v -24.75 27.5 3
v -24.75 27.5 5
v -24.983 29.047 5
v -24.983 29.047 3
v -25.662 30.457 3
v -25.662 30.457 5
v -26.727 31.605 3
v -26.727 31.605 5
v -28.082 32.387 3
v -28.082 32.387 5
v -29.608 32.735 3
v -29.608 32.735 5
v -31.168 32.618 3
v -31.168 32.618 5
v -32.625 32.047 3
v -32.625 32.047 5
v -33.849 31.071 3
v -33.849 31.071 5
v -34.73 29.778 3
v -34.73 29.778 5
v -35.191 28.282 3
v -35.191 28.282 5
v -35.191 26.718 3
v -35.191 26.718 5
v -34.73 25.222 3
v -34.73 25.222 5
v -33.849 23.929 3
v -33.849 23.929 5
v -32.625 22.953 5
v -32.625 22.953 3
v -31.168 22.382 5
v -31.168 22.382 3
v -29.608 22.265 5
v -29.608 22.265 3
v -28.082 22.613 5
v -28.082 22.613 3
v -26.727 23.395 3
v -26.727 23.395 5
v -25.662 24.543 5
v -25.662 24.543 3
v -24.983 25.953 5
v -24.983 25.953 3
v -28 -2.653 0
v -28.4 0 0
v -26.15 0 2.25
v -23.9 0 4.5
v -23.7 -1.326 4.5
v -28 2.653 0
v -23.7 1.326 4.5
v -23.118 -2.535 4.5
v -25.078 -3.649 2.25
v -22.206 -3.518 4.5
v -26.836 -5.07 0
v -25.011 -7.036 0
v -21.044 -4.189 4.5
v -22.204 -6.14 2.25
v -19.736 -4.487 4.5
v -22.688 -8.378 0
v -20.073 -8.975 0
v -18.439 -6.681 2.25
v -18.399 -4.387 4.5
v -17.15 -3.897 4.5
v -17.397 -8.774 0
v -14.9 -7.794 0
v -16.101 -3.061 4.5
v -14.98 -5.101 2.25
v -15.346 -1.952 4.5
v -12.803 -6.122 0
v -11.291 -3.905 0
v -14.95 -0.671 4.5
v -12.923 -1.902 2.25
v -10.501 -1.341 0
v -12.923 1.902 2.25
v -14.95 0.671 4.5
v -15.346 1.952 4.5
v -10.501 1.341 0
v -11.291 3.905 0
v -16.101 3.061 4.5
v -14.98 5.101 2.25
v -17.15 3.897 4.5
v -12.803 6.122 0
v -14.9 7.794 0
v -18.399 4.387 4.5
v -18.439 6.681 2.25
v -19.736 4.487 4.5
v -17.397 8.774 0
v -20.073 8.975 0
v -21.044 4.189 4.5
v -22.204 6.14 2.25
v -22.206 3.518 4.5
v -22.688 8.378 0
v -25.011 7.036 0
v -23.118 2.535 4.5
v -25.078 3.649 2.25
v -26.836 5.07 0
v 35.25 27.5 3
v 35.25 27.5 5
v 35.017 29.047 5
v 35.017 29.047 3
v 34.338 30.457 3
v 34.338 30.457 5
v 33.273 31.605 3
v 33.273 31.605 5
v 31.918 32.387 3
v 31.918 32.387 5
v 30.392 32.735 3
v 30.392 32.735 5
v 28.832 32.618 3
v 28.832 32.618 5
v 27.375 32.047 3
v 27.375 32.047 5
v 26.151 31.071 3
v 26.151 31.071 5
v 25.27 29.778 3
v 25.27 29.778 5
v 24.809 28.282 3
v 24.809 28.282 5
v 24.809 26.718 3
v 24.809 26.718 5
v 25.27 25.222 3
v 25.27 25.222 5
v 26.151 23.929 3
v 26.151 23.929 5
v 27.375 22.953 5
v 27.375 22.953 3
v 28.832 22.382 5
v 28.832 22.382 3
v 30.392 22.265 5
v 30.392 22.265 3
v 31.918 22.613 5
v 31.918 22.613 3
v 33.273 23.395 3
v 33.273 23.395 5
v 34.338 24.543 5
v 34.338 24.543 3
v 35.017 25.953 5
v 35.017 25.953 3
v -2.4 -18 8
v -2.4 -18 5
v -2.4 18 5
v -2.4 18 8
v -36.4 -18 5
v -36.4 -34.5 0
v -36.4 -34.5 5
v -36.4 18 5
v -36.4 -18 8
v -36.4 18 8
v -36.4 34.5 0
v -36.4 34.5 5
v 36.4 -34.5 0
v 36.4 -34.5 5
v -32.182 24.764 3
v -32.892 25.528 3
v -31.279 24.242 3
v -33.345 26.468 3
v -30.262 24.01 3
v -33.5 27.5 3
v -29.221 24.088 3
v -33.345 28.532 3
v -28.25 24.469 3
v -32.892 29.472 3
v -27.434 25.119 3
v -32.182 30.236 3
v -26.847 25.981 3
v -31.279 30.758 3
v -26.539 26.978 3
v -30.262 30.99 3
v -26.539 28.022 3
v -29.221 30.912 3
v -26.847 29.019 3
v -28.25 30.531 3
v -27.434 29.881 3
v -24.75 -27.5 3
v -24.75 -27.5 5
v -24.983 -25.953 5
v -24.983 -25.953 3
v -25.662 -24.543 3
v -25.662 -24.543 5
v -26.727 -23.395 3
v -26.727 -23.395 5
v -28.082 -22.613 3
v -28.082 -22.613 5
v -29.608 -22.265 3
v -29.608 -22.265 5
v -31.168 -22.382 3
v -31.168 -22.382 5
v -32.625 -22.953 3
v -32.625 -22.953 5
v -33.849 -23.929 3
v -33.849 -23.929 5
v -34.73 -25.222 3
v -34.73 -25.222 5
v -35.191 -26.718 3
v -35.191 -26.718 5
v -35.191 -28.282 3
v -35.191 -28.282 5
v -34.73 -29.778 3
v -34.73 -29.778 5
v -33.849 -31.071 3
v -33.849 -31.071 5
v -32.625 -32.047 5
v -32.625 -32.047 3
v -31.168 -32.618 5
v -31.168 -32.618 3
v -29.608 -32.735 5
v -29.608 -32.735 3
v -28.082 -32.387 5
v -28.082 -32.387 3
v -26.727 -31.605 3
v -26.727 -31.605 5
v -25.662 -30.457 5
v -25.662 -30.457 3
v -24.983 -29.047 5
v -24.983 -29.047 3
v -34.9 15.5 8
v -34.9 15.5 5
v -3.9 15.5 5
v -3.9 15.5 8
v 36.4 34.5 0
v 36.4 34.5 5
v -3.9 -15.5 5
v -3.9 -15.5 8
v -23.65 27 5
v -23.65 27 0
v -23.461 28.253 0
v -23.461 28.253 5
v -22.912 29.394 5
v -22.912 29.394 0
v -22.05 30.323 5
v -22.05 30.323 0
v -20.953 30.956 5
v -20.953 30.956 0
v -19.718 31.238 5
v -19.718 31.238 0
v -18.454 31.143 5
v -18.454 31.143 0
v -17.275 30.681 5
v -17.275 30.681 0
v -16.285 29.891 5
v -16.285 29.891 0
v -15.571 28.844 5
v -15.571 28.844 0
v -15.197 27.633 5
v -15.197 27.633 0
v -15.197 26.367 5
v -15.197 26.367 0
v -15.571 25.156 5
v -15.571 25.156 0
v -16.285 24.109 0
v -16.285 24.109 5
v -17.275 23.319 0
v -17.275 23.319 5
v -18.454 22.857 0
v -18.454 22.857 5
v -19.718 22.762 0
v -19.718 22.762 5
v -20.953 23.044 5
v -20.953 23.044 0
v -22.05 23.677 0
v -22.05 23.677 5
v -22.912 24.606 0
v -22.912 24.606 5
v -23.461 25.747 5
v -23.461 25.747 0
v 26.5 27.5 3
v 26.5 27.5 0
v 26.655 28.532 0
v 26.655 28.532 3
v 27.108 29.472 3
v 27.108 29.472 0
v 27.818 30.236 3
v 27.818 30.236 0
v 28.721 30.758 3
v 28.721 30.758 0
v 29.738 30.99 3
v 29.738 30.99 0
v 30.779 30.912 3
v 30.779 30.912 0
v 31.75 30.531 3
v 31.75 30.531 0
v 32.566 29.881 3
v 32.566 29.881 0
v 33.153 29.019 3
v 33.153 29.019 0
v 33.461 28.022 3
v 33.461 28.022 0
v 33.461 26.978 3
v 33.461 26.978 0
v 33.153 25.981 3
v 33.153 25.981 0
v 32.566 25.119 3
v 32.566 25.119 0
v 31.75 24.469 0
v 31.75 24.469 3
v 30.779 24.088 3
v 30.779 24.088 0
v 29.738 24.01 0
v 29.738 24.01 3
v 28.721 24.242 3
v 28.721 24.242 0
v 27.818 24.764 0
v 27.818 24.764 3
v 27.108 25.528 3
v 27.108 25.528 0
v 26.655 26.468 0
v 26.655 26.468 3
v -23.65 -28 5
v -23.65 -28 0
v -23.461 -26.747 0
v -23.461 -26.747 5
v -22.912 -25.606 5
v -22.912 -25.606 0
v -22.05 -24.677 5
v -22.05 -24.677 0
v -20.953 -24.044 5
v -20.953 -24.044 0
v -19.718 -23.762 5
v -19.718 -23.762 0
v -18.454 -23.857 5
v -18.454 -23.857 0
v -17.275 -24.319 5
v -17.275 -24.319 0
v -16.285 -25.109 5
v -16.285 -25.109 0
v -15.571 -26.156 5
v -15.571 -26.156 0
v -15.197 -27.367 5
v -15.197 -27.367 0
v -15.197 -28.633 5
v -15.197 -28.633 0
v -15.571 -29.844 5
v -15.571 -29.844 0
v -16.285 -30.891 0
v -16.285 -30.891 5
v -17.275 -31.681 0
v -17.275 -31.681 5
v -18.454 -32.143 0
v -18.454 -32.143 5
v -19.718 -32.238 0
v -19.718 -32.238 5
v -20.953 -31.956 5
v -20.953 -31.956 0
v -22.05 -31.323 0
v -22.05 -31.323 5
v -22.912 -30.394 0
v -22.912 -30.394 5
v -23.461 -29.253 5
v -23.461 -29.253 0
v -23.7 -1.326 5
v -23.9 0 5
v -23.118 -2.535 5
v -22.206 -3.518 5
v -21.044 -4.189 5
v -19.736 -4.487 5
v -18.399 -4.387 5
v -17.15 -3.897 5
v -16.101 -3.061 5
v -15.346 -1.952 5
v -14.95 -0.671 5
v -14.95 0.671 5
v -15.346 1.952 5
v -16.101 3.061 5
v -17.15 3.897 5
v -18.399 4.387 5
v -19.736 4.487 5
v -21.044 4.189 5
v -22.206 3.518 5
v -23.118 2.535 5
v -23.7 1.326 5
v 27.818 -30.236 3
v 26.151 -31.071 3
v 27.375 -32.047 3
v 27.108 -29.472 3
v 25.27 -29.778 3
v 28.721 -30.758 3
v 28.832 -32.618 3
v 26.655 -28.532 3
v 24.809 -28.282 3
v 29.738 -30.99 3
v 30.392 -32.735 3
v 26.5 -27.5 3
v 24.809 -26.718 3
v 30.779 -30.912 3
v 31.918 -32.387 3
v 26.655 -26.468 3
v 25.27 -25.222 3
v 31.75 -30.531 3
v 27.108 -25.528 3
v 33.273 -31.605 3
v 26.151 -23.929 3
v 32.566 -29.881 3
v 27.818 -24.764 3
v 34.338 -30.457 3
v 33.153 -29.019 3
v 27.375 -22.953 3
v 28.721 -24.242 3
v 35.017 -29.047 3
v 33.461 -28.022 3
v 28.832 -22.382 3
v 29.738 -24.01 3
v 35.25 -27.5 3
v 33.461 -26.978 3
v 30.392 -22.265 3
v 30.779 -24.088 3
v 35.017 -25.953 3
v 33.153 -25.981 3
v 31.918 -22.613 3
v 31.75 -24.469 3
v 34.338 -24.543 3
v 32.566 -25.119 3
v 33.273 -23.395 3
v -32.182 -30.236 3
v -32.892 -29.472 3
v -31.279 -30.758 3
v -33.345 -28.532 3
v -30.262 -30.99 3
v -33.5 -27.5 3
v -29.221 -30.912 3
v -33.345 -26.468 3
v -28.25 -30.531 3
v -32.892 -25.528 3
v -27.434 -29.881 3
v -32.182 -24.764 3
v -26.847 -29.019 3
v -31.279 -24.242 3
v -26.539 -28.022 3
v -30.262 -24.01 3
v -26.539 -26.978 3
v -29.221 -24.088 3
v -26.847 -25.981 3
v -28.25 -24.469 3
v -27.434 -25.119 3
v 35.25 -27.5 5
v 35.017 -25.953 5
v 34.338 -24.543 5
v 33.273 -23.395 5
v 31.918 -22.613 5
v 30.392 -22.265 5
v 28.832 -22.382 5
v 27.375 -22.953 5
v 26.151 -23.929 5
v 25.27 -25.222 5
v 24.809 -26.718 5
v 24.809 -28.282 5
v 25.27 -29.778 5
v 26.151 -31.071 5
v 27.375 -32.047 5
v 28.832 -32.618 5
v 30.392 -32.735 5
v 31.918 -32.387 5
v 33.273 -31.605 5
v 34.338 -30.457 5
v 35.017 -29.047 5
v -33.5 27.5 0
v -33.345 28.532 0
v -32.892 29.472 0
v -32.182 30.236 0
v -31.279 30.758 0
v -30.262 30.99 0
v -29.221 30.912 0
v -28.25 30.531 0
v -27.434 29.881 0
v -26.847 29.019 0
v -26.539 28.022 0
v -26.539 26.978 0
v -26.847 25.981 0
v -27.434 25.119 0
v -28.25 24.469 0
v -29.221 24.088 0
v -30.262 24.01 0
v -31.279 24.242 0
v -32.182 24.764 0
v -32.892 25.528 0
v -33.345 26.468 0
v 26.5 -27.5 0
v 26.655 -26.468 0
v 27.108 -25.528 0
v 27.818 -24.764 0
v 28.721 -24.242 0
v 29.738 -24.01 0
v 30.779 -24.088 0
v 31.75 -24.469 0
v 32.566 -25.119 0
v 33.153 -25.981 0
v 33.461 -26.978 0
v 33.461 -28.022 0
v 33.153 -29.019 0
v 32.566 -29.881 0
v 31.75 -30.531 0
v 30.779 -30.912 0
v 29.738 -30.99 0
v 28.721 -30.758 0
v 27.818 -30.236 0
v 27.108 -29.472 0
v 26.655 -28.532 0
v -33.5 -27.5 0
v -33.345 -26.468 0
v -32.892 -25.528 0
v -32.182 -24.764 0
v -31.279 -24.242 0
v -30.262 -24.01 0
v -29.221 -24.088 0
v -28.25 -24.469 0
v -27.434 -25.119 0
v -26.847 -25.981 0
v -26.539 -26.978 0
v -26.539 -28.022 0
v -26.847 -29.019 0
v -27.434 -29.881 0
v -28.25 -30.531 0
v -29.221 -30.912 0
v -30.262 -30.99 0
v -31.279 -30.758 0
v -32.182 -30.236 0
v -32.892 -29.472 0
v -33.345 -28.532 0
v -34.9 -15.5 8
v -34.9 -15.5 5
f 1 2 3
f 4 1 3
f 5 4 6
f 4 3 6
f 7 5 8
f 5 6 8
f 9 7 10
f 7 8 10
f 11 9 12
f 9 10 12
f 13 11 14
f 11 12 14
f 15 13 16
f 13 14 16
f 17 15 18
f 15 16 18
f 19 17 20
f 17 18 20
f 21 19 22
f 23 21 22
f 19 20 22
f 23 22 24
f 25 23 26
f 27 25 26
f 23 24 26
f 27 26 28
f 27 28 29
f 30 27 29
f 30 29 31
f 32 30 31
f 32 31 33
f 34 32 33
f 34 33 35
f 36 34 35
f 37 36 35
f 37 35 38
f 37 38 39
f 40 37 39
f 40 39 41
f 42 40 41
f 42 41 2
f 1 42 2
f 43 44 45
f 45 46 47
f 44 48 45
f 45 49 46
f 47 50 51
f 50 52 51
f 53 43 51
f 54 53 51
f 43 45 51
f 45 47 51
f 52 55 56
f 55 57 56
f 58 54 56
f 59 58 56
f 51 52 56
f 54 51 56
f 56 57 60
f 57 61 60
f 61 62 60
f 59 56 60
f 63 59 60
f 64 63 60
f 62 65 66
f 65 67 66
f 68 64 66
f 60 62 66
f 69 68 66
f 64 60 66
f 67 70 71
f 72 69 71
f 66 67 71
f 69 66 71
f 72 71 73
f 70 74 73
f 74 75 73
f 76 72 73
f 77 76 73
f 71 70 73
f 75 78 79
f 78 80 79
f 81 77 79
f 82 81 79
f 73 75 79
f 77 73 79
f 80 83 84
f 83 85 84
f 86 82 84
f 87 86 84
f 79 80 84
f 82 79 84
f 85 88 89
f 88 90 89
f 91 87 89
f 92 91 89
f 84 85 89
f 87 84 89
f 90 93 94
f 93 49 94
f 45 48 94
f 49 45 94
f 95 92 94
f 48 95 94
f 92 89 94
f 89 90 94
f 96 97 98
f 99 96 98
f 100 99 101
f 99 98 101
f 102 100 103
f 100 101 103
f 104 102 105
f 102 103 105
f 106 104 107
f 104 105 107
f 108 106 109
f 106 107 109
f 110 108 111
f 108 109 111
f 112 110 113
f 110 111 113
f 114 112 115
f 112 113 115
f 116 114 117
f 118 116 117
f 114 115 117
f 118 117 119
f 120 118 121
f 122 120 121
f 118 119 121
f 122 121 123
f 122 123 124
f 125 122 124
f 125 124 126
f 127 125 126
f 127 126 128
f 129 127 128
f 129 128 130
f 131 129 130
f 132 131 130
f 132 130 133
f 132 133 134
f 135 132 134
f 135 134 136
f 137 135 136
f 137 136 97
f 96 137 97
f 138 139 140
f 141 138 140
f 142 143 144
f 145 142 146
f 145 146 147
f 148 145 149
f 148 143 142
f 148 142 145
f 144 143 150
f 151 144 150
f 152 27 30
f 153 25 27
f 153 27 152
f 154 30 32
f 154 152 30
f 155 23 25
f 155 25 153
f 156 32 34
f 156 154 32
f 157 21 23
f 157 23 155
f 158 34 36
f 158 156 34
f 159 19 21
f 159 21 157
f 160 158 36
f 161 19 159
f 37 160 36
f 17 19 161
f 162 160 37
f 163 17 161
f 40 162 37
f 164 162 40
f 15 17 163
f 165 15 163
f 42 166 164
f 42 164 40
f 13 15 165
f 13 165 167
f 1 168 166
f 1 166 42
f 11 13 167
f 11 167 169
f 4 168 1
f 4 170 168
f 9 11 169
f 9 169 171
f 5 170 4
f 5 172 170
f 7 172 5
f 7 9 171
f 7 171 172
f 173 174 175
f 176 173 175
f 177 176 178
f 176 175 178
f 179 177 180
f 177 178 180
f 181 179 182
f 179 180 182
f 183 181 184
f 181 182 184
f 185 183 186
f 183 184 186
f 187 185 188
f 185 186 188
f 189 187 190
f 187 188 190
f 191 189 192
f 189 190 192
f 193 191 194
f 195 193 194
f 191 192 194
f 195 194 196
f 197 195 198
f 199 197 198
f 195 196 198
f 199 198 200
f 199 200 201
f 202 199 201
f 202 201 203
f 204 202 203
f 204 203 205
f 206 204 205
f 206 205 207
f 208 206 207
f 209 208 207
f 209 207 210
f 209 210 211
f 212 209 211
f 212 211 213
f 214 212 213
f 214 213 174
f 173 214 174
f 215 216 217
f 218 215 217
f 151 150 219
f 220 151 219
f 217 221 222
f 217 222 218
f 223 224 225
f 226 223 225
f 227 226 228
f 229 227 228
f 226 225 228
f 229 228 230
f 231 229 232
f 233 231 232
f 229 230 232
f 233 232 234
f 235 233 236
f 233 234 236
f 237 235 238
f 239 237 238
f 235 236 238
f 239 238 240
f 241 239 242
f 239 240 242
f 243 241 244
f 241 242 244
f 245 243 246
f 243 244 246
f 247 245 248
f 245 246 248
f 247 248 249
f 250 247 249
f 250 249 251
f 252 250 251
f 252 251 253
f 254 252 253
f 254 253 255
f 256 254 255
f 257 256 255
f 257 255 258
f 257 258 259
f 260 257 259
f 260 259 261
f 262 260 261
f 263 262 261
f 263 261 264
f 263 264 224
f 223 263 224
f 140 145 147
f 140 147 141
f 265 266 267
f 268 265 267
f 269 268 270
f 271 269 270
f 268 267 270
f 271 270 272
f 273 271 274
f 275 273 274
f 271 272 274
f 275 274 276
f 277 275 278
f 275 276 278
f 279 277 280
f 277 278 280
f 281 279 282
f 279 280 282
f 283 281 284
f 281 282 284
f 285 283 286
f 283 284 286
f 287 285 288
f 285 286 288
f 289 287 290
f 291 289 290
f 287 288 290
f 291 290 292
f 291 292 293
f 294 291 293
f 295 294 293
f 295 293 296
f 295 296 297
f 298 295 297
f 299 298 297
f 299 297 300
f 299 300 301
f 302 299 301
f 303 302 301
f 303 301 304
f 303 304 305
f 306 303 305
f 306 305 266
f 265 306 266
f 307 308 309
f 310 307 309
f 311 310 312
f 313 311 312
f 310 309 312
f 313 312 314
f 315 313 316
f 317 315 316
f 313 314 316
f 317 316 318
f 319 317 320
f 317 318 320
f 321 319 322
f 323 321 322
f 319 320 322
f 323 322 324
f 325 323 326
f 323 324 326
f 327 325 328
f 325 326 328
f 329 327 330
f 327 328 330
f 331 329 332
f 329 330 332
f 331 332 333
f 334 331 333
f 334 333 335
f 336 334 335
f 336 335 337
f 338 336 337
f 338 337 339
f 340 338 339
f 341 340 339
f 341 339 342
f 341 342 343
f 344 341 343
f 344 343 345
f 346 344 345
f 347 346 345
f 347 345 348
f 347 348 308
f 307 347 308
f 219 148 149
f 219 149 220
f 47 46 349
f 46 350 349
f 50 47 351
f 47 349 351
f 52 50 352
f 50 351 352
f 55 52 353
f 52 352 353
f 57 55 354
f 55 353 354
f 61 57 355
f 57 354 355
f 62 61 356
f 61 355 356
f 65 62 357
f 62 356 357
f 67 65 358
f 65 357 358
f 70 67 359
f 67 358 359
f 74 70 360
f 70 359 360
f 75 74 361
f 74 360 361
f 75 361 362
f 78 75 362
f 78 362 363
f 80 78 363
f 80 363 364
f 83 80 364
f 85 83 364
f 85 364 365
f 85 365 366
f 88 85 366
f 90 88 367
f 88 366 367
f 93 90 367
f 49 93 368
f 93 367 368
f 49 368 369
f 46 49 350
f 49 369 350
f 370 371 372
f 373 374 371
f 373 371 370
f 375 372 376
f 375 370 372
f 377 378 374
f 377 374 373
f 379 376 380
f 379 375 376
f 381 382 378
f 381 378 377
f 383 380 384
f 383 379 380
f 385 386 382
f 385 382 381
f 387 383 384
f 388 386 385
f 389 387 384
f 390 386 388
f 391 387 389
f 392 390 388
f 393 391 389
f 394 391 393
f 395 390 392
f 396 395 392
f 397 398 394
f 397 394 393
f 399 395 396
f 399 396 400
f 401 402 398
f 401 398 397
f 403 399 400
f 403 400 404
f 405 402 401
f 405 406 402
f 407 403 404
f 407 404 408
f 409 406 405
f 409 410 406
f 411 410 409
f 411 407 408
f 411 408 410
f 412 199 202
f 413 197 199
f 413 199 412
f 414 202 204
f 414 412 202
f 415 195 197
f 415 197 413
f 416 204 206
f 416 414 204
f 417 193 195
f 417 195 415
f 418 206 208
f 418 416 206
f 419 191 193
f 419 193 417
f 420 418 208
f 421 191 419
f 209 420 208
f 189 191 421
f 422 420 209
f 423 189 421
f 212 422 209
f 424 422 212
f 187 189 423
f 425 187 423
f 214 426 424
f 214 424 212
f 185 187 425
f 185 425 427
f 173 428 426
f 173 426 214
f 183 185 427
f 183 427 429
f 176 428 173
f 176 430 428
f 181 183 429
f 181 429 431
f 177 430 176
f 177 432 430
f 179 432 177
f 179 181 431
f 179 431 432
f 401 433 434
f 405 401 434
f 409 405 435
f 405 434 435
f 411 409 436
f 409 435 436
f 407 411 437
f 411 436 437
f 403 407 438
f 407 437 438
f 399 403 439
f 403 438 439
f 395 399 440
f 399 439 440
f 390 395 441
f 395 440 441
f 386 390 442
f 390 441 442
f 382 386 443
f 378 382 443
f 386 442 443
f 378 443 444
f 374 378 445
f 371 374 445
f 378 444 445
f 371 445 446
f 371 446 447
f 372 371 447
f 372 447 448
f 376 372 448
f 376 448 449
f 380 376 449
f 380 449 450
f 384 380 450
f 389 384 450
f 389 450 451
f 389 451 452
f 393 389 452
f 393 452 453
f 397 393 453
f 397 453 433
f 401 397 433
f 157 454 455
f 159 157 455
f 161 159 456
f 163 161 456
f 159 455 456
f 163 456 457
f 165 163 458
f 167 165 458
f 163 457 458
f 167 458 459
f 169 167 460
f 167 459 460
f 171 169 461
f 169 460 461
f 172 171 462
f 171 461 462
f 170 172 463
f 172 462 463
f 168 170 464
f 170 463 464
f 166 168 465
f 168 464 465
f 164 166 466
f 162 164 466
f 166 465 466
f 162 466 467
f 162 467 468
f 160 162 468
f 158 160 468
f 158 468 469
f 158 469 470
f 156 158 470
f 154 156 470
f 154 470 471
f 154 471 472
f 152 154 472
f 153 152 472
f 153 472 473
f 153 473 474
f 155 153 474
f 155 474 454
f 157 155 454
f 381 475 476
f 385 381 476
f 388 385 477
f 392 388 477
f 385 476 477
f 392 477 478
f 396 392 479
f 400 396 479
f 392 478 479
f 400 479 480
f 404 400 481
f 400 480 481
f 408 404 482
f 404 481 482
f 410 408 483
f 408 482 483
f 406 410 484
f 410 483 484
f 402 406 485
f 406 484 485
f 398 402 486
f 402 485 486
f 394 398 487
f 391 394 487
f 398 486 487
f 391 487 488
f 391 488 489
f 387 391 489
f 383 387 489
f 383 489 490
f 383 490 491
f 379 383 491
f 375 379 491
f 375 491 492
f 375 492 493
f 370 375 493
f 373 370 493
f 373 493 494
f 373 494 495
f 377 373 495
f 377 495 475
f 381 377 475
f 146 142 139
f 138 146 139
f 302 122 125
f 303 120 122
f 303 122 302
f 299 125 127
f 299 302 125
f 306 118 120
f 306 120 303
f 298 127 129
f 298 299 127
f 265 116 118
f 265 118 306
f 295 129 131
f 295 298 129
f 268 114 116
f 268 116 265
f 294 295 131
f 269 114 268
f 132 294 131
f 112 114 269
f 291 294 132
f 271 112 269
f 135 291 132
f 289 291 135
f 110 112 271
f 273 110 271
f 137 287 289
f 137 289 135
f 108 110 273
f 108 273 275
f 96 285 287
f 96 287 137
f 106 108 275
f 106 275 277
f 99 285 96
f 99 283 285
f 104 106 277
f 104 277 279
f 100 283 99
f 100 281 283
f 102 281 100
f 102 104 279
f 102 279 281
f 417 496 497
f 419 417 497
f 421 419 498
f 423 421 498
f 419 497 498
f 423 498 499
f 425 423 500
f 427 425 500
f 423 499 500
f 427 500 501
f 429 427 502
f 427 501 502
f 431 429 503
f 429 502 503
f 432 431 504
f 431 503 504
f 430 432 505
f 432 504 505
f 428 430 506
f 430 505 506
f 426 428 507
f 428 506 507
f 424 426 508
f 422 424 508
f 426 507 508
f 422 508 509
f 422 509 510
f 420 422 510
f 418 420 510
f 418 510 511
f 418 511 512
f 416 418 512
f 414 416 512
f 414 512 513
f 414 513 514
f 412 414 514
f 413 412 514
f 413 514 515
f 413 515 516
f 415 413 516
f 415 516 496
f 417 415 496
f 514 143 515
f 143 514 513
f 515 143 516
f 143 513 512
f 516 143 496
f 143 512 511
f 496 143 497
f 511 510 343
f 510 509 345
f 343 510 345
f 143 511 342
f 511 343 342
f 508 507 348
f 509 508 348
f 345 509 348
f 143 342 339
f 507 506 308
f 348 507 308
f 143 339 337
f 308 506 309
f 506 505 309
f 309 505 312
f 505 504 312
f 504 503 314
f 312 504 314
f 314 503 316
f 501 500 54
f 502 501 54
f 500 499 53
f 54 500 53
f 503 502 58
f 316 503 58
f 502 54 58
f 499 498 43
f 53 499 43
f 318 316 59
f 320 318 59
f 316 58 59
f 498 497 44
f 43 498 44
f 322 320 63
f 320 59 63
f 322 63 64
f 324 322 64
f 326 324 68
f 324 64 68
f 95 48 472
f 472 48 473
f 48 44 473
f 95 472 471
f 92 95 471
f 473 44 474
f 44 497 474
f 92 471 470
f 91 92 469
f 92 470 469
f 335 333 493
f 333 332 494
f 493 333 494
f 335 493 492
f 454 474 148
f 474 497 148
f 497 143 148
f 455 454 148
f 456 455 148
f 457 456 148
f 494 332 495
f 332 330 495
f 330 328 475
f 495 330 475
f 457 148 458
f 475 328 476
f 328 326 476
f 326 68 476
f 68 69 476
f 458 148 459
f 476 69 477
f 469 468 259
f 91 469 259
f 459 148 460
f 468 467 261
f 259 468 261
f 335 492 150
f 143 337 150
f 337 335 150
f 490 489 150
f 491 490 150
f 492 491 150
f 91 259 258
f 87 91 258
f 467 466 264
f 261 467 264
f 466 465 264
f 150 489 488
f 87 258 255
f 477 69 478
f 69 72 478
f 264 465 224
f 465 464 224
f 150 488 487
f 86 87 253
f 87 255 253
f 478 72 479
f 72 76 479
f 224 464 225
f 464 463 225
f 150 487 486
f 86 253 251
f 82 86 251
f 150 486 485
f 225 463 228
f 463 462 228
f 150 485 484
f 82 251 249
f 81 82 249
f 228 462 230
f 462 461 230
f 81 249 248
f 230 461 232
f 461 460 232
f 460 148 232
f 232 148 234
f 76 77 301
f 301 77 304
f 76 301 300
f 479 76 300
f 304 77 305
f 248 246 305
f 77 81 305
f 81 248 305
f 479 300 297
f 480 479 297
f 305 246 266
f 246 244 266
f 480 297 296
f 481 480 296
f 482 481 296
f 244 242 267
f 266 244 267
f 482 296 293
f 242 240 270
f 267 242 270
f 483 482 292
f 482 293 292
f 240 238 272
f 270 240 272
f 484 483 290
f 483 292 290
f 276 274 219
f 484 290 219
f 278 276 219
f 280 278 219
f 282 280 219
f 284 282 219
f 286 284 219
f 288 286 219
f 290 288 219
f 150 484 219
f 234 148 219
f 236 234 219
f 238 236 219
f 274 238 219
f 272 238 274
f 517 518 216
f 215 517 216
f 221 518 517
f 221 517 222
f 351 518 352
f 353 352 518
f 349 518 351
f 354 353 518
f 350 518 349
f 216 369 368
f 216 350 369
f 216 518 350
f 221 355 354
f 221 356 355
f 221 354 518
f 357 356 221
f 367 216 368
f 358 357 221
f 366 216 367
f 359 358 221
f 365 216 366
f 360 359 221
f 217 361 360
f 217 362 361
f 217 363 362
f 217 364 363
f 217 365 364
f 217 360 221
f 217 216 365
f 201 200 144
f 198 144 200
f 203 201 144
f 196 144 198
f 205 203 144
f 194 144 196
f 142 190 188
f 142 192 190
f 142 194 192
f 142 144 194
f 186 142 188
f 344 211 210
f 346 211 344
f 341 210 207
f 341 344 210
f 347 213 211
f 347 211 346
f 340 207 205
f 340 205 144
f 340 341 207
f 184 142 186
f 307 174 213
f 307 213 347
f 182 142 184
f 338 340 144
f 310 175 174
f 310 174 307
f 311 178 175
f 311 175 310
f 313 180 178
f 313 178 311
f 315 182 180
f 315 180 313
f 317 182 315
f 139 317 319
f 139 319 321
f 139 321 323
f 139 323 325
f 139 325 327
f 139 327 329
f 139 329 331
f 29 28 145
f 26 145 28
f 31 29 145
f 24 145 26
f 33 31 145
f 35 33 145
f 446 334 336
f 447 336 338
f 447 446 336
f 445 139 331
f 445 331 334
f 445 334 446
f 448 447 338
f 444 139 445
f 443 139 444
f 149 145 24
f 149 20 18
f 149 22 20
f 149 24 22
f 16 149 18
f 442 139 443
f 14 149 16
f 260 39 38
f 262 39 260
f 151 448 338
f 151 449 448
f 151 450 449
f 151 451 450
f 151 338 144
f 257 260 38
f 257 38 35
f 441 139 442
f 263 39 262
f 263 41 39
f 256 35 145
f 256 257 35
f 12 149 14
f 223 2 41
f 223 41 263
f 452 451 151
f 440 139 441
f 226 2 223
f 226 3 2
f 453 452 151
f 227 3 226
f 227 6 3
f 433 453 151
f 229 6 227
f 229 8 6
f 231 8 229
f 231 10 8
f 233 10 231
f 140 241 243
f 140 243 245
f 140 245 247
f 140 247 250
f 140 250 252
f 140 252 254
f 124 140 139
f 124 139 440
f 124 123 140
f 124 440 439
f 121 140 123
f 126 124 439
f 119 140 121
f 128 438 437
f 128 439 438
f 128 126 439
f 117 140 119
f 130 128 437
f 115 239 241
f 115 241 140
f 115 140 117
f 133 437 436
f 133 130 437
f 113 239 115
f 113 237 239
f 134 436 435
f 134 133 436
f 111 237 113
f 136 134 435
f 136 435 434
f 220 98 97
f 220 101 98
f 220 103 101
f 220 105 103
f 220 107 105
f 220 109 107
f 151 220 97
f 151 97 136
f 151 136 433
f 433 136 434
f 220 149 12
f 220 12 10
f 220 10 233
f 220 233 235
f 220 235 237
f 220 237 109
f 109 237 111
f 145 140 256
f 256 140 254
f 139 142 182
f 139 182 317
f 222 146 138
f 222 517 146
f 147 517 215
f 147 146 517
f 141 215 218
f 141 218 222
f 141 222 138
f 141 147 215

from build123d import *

# Parameters (mm, degrees)
F0_W            = 72.8
F0_H            = 69
F1_DEPTH        = 5
F3_D            = 7
F5_D            = 8.5
F6_W            = 34
F6_H            = 36
F6_W_2          = 31
F6_H_2          = 31
F7_DEPTH        = 3
F9_D            = 9
F9_CSINK_D      = 18
F9_CSINK_ANGLE  = 90
F11_D           = 7
F11_CBORE_D     = 10.5
F11_CBORE_DEPTH = 2


with BuildPart() as f1:
    # F0 (on Top) → F1 (new body)
    with BuildSketch(Plane.XY):
        Rectangle(F0_W, F0_H)
    extrude(amount=F1_DEPTH)

    # F3 (through all)
    with Locations(Plane.XY.offset(5)):
        with Locations((-30, 27.5), (30, 27.5), (30, -27.5), (-30, -27.5)):
            Hole(F3_D / 2)

    # F5 (through all)
    with Locations(Plane.XY.offset(5)):
        with Locations((-19.4, 27), (-19.4, -28)):
            Hole(F5_D / 2)

    # F6 (on face) → F7 (join)
    with BuildSketch(Plane.XY.offset(5)):
        with Locations((-19.4, 0)):
            Rectangle(F6_W, F6_H)
        with Locations((-19.4, 0)):
            Rectangle(F6_W_2, F6_H_2, mode=Mode.SUBTRACT)
    extrude(amount=F7_DEPTH)

    # F9 (through all)
    with Locations(Plane(origin=(0, 0, 0), x_dir=(1, 0, 0), z_dir=(0, 0, -1))):
        with Locations((-19.4, 0)):
            CounterSinkHole(F9_D / 2, F9_CSINK_D / 2, counter_sink_angle=F9_CSINK_ANGLE)

    # F11 (through all)
    with Locations(Plane.XY.offset(5)):
        with Locations((-30, 27.5), (30, 27.5), (30, -27.5), (-30, -27.5)):
            CounterBoreHole(F11_D / 2, F11_CBORE_D / 2, F11_CBORE_DEPTH)


solid = f1.part
